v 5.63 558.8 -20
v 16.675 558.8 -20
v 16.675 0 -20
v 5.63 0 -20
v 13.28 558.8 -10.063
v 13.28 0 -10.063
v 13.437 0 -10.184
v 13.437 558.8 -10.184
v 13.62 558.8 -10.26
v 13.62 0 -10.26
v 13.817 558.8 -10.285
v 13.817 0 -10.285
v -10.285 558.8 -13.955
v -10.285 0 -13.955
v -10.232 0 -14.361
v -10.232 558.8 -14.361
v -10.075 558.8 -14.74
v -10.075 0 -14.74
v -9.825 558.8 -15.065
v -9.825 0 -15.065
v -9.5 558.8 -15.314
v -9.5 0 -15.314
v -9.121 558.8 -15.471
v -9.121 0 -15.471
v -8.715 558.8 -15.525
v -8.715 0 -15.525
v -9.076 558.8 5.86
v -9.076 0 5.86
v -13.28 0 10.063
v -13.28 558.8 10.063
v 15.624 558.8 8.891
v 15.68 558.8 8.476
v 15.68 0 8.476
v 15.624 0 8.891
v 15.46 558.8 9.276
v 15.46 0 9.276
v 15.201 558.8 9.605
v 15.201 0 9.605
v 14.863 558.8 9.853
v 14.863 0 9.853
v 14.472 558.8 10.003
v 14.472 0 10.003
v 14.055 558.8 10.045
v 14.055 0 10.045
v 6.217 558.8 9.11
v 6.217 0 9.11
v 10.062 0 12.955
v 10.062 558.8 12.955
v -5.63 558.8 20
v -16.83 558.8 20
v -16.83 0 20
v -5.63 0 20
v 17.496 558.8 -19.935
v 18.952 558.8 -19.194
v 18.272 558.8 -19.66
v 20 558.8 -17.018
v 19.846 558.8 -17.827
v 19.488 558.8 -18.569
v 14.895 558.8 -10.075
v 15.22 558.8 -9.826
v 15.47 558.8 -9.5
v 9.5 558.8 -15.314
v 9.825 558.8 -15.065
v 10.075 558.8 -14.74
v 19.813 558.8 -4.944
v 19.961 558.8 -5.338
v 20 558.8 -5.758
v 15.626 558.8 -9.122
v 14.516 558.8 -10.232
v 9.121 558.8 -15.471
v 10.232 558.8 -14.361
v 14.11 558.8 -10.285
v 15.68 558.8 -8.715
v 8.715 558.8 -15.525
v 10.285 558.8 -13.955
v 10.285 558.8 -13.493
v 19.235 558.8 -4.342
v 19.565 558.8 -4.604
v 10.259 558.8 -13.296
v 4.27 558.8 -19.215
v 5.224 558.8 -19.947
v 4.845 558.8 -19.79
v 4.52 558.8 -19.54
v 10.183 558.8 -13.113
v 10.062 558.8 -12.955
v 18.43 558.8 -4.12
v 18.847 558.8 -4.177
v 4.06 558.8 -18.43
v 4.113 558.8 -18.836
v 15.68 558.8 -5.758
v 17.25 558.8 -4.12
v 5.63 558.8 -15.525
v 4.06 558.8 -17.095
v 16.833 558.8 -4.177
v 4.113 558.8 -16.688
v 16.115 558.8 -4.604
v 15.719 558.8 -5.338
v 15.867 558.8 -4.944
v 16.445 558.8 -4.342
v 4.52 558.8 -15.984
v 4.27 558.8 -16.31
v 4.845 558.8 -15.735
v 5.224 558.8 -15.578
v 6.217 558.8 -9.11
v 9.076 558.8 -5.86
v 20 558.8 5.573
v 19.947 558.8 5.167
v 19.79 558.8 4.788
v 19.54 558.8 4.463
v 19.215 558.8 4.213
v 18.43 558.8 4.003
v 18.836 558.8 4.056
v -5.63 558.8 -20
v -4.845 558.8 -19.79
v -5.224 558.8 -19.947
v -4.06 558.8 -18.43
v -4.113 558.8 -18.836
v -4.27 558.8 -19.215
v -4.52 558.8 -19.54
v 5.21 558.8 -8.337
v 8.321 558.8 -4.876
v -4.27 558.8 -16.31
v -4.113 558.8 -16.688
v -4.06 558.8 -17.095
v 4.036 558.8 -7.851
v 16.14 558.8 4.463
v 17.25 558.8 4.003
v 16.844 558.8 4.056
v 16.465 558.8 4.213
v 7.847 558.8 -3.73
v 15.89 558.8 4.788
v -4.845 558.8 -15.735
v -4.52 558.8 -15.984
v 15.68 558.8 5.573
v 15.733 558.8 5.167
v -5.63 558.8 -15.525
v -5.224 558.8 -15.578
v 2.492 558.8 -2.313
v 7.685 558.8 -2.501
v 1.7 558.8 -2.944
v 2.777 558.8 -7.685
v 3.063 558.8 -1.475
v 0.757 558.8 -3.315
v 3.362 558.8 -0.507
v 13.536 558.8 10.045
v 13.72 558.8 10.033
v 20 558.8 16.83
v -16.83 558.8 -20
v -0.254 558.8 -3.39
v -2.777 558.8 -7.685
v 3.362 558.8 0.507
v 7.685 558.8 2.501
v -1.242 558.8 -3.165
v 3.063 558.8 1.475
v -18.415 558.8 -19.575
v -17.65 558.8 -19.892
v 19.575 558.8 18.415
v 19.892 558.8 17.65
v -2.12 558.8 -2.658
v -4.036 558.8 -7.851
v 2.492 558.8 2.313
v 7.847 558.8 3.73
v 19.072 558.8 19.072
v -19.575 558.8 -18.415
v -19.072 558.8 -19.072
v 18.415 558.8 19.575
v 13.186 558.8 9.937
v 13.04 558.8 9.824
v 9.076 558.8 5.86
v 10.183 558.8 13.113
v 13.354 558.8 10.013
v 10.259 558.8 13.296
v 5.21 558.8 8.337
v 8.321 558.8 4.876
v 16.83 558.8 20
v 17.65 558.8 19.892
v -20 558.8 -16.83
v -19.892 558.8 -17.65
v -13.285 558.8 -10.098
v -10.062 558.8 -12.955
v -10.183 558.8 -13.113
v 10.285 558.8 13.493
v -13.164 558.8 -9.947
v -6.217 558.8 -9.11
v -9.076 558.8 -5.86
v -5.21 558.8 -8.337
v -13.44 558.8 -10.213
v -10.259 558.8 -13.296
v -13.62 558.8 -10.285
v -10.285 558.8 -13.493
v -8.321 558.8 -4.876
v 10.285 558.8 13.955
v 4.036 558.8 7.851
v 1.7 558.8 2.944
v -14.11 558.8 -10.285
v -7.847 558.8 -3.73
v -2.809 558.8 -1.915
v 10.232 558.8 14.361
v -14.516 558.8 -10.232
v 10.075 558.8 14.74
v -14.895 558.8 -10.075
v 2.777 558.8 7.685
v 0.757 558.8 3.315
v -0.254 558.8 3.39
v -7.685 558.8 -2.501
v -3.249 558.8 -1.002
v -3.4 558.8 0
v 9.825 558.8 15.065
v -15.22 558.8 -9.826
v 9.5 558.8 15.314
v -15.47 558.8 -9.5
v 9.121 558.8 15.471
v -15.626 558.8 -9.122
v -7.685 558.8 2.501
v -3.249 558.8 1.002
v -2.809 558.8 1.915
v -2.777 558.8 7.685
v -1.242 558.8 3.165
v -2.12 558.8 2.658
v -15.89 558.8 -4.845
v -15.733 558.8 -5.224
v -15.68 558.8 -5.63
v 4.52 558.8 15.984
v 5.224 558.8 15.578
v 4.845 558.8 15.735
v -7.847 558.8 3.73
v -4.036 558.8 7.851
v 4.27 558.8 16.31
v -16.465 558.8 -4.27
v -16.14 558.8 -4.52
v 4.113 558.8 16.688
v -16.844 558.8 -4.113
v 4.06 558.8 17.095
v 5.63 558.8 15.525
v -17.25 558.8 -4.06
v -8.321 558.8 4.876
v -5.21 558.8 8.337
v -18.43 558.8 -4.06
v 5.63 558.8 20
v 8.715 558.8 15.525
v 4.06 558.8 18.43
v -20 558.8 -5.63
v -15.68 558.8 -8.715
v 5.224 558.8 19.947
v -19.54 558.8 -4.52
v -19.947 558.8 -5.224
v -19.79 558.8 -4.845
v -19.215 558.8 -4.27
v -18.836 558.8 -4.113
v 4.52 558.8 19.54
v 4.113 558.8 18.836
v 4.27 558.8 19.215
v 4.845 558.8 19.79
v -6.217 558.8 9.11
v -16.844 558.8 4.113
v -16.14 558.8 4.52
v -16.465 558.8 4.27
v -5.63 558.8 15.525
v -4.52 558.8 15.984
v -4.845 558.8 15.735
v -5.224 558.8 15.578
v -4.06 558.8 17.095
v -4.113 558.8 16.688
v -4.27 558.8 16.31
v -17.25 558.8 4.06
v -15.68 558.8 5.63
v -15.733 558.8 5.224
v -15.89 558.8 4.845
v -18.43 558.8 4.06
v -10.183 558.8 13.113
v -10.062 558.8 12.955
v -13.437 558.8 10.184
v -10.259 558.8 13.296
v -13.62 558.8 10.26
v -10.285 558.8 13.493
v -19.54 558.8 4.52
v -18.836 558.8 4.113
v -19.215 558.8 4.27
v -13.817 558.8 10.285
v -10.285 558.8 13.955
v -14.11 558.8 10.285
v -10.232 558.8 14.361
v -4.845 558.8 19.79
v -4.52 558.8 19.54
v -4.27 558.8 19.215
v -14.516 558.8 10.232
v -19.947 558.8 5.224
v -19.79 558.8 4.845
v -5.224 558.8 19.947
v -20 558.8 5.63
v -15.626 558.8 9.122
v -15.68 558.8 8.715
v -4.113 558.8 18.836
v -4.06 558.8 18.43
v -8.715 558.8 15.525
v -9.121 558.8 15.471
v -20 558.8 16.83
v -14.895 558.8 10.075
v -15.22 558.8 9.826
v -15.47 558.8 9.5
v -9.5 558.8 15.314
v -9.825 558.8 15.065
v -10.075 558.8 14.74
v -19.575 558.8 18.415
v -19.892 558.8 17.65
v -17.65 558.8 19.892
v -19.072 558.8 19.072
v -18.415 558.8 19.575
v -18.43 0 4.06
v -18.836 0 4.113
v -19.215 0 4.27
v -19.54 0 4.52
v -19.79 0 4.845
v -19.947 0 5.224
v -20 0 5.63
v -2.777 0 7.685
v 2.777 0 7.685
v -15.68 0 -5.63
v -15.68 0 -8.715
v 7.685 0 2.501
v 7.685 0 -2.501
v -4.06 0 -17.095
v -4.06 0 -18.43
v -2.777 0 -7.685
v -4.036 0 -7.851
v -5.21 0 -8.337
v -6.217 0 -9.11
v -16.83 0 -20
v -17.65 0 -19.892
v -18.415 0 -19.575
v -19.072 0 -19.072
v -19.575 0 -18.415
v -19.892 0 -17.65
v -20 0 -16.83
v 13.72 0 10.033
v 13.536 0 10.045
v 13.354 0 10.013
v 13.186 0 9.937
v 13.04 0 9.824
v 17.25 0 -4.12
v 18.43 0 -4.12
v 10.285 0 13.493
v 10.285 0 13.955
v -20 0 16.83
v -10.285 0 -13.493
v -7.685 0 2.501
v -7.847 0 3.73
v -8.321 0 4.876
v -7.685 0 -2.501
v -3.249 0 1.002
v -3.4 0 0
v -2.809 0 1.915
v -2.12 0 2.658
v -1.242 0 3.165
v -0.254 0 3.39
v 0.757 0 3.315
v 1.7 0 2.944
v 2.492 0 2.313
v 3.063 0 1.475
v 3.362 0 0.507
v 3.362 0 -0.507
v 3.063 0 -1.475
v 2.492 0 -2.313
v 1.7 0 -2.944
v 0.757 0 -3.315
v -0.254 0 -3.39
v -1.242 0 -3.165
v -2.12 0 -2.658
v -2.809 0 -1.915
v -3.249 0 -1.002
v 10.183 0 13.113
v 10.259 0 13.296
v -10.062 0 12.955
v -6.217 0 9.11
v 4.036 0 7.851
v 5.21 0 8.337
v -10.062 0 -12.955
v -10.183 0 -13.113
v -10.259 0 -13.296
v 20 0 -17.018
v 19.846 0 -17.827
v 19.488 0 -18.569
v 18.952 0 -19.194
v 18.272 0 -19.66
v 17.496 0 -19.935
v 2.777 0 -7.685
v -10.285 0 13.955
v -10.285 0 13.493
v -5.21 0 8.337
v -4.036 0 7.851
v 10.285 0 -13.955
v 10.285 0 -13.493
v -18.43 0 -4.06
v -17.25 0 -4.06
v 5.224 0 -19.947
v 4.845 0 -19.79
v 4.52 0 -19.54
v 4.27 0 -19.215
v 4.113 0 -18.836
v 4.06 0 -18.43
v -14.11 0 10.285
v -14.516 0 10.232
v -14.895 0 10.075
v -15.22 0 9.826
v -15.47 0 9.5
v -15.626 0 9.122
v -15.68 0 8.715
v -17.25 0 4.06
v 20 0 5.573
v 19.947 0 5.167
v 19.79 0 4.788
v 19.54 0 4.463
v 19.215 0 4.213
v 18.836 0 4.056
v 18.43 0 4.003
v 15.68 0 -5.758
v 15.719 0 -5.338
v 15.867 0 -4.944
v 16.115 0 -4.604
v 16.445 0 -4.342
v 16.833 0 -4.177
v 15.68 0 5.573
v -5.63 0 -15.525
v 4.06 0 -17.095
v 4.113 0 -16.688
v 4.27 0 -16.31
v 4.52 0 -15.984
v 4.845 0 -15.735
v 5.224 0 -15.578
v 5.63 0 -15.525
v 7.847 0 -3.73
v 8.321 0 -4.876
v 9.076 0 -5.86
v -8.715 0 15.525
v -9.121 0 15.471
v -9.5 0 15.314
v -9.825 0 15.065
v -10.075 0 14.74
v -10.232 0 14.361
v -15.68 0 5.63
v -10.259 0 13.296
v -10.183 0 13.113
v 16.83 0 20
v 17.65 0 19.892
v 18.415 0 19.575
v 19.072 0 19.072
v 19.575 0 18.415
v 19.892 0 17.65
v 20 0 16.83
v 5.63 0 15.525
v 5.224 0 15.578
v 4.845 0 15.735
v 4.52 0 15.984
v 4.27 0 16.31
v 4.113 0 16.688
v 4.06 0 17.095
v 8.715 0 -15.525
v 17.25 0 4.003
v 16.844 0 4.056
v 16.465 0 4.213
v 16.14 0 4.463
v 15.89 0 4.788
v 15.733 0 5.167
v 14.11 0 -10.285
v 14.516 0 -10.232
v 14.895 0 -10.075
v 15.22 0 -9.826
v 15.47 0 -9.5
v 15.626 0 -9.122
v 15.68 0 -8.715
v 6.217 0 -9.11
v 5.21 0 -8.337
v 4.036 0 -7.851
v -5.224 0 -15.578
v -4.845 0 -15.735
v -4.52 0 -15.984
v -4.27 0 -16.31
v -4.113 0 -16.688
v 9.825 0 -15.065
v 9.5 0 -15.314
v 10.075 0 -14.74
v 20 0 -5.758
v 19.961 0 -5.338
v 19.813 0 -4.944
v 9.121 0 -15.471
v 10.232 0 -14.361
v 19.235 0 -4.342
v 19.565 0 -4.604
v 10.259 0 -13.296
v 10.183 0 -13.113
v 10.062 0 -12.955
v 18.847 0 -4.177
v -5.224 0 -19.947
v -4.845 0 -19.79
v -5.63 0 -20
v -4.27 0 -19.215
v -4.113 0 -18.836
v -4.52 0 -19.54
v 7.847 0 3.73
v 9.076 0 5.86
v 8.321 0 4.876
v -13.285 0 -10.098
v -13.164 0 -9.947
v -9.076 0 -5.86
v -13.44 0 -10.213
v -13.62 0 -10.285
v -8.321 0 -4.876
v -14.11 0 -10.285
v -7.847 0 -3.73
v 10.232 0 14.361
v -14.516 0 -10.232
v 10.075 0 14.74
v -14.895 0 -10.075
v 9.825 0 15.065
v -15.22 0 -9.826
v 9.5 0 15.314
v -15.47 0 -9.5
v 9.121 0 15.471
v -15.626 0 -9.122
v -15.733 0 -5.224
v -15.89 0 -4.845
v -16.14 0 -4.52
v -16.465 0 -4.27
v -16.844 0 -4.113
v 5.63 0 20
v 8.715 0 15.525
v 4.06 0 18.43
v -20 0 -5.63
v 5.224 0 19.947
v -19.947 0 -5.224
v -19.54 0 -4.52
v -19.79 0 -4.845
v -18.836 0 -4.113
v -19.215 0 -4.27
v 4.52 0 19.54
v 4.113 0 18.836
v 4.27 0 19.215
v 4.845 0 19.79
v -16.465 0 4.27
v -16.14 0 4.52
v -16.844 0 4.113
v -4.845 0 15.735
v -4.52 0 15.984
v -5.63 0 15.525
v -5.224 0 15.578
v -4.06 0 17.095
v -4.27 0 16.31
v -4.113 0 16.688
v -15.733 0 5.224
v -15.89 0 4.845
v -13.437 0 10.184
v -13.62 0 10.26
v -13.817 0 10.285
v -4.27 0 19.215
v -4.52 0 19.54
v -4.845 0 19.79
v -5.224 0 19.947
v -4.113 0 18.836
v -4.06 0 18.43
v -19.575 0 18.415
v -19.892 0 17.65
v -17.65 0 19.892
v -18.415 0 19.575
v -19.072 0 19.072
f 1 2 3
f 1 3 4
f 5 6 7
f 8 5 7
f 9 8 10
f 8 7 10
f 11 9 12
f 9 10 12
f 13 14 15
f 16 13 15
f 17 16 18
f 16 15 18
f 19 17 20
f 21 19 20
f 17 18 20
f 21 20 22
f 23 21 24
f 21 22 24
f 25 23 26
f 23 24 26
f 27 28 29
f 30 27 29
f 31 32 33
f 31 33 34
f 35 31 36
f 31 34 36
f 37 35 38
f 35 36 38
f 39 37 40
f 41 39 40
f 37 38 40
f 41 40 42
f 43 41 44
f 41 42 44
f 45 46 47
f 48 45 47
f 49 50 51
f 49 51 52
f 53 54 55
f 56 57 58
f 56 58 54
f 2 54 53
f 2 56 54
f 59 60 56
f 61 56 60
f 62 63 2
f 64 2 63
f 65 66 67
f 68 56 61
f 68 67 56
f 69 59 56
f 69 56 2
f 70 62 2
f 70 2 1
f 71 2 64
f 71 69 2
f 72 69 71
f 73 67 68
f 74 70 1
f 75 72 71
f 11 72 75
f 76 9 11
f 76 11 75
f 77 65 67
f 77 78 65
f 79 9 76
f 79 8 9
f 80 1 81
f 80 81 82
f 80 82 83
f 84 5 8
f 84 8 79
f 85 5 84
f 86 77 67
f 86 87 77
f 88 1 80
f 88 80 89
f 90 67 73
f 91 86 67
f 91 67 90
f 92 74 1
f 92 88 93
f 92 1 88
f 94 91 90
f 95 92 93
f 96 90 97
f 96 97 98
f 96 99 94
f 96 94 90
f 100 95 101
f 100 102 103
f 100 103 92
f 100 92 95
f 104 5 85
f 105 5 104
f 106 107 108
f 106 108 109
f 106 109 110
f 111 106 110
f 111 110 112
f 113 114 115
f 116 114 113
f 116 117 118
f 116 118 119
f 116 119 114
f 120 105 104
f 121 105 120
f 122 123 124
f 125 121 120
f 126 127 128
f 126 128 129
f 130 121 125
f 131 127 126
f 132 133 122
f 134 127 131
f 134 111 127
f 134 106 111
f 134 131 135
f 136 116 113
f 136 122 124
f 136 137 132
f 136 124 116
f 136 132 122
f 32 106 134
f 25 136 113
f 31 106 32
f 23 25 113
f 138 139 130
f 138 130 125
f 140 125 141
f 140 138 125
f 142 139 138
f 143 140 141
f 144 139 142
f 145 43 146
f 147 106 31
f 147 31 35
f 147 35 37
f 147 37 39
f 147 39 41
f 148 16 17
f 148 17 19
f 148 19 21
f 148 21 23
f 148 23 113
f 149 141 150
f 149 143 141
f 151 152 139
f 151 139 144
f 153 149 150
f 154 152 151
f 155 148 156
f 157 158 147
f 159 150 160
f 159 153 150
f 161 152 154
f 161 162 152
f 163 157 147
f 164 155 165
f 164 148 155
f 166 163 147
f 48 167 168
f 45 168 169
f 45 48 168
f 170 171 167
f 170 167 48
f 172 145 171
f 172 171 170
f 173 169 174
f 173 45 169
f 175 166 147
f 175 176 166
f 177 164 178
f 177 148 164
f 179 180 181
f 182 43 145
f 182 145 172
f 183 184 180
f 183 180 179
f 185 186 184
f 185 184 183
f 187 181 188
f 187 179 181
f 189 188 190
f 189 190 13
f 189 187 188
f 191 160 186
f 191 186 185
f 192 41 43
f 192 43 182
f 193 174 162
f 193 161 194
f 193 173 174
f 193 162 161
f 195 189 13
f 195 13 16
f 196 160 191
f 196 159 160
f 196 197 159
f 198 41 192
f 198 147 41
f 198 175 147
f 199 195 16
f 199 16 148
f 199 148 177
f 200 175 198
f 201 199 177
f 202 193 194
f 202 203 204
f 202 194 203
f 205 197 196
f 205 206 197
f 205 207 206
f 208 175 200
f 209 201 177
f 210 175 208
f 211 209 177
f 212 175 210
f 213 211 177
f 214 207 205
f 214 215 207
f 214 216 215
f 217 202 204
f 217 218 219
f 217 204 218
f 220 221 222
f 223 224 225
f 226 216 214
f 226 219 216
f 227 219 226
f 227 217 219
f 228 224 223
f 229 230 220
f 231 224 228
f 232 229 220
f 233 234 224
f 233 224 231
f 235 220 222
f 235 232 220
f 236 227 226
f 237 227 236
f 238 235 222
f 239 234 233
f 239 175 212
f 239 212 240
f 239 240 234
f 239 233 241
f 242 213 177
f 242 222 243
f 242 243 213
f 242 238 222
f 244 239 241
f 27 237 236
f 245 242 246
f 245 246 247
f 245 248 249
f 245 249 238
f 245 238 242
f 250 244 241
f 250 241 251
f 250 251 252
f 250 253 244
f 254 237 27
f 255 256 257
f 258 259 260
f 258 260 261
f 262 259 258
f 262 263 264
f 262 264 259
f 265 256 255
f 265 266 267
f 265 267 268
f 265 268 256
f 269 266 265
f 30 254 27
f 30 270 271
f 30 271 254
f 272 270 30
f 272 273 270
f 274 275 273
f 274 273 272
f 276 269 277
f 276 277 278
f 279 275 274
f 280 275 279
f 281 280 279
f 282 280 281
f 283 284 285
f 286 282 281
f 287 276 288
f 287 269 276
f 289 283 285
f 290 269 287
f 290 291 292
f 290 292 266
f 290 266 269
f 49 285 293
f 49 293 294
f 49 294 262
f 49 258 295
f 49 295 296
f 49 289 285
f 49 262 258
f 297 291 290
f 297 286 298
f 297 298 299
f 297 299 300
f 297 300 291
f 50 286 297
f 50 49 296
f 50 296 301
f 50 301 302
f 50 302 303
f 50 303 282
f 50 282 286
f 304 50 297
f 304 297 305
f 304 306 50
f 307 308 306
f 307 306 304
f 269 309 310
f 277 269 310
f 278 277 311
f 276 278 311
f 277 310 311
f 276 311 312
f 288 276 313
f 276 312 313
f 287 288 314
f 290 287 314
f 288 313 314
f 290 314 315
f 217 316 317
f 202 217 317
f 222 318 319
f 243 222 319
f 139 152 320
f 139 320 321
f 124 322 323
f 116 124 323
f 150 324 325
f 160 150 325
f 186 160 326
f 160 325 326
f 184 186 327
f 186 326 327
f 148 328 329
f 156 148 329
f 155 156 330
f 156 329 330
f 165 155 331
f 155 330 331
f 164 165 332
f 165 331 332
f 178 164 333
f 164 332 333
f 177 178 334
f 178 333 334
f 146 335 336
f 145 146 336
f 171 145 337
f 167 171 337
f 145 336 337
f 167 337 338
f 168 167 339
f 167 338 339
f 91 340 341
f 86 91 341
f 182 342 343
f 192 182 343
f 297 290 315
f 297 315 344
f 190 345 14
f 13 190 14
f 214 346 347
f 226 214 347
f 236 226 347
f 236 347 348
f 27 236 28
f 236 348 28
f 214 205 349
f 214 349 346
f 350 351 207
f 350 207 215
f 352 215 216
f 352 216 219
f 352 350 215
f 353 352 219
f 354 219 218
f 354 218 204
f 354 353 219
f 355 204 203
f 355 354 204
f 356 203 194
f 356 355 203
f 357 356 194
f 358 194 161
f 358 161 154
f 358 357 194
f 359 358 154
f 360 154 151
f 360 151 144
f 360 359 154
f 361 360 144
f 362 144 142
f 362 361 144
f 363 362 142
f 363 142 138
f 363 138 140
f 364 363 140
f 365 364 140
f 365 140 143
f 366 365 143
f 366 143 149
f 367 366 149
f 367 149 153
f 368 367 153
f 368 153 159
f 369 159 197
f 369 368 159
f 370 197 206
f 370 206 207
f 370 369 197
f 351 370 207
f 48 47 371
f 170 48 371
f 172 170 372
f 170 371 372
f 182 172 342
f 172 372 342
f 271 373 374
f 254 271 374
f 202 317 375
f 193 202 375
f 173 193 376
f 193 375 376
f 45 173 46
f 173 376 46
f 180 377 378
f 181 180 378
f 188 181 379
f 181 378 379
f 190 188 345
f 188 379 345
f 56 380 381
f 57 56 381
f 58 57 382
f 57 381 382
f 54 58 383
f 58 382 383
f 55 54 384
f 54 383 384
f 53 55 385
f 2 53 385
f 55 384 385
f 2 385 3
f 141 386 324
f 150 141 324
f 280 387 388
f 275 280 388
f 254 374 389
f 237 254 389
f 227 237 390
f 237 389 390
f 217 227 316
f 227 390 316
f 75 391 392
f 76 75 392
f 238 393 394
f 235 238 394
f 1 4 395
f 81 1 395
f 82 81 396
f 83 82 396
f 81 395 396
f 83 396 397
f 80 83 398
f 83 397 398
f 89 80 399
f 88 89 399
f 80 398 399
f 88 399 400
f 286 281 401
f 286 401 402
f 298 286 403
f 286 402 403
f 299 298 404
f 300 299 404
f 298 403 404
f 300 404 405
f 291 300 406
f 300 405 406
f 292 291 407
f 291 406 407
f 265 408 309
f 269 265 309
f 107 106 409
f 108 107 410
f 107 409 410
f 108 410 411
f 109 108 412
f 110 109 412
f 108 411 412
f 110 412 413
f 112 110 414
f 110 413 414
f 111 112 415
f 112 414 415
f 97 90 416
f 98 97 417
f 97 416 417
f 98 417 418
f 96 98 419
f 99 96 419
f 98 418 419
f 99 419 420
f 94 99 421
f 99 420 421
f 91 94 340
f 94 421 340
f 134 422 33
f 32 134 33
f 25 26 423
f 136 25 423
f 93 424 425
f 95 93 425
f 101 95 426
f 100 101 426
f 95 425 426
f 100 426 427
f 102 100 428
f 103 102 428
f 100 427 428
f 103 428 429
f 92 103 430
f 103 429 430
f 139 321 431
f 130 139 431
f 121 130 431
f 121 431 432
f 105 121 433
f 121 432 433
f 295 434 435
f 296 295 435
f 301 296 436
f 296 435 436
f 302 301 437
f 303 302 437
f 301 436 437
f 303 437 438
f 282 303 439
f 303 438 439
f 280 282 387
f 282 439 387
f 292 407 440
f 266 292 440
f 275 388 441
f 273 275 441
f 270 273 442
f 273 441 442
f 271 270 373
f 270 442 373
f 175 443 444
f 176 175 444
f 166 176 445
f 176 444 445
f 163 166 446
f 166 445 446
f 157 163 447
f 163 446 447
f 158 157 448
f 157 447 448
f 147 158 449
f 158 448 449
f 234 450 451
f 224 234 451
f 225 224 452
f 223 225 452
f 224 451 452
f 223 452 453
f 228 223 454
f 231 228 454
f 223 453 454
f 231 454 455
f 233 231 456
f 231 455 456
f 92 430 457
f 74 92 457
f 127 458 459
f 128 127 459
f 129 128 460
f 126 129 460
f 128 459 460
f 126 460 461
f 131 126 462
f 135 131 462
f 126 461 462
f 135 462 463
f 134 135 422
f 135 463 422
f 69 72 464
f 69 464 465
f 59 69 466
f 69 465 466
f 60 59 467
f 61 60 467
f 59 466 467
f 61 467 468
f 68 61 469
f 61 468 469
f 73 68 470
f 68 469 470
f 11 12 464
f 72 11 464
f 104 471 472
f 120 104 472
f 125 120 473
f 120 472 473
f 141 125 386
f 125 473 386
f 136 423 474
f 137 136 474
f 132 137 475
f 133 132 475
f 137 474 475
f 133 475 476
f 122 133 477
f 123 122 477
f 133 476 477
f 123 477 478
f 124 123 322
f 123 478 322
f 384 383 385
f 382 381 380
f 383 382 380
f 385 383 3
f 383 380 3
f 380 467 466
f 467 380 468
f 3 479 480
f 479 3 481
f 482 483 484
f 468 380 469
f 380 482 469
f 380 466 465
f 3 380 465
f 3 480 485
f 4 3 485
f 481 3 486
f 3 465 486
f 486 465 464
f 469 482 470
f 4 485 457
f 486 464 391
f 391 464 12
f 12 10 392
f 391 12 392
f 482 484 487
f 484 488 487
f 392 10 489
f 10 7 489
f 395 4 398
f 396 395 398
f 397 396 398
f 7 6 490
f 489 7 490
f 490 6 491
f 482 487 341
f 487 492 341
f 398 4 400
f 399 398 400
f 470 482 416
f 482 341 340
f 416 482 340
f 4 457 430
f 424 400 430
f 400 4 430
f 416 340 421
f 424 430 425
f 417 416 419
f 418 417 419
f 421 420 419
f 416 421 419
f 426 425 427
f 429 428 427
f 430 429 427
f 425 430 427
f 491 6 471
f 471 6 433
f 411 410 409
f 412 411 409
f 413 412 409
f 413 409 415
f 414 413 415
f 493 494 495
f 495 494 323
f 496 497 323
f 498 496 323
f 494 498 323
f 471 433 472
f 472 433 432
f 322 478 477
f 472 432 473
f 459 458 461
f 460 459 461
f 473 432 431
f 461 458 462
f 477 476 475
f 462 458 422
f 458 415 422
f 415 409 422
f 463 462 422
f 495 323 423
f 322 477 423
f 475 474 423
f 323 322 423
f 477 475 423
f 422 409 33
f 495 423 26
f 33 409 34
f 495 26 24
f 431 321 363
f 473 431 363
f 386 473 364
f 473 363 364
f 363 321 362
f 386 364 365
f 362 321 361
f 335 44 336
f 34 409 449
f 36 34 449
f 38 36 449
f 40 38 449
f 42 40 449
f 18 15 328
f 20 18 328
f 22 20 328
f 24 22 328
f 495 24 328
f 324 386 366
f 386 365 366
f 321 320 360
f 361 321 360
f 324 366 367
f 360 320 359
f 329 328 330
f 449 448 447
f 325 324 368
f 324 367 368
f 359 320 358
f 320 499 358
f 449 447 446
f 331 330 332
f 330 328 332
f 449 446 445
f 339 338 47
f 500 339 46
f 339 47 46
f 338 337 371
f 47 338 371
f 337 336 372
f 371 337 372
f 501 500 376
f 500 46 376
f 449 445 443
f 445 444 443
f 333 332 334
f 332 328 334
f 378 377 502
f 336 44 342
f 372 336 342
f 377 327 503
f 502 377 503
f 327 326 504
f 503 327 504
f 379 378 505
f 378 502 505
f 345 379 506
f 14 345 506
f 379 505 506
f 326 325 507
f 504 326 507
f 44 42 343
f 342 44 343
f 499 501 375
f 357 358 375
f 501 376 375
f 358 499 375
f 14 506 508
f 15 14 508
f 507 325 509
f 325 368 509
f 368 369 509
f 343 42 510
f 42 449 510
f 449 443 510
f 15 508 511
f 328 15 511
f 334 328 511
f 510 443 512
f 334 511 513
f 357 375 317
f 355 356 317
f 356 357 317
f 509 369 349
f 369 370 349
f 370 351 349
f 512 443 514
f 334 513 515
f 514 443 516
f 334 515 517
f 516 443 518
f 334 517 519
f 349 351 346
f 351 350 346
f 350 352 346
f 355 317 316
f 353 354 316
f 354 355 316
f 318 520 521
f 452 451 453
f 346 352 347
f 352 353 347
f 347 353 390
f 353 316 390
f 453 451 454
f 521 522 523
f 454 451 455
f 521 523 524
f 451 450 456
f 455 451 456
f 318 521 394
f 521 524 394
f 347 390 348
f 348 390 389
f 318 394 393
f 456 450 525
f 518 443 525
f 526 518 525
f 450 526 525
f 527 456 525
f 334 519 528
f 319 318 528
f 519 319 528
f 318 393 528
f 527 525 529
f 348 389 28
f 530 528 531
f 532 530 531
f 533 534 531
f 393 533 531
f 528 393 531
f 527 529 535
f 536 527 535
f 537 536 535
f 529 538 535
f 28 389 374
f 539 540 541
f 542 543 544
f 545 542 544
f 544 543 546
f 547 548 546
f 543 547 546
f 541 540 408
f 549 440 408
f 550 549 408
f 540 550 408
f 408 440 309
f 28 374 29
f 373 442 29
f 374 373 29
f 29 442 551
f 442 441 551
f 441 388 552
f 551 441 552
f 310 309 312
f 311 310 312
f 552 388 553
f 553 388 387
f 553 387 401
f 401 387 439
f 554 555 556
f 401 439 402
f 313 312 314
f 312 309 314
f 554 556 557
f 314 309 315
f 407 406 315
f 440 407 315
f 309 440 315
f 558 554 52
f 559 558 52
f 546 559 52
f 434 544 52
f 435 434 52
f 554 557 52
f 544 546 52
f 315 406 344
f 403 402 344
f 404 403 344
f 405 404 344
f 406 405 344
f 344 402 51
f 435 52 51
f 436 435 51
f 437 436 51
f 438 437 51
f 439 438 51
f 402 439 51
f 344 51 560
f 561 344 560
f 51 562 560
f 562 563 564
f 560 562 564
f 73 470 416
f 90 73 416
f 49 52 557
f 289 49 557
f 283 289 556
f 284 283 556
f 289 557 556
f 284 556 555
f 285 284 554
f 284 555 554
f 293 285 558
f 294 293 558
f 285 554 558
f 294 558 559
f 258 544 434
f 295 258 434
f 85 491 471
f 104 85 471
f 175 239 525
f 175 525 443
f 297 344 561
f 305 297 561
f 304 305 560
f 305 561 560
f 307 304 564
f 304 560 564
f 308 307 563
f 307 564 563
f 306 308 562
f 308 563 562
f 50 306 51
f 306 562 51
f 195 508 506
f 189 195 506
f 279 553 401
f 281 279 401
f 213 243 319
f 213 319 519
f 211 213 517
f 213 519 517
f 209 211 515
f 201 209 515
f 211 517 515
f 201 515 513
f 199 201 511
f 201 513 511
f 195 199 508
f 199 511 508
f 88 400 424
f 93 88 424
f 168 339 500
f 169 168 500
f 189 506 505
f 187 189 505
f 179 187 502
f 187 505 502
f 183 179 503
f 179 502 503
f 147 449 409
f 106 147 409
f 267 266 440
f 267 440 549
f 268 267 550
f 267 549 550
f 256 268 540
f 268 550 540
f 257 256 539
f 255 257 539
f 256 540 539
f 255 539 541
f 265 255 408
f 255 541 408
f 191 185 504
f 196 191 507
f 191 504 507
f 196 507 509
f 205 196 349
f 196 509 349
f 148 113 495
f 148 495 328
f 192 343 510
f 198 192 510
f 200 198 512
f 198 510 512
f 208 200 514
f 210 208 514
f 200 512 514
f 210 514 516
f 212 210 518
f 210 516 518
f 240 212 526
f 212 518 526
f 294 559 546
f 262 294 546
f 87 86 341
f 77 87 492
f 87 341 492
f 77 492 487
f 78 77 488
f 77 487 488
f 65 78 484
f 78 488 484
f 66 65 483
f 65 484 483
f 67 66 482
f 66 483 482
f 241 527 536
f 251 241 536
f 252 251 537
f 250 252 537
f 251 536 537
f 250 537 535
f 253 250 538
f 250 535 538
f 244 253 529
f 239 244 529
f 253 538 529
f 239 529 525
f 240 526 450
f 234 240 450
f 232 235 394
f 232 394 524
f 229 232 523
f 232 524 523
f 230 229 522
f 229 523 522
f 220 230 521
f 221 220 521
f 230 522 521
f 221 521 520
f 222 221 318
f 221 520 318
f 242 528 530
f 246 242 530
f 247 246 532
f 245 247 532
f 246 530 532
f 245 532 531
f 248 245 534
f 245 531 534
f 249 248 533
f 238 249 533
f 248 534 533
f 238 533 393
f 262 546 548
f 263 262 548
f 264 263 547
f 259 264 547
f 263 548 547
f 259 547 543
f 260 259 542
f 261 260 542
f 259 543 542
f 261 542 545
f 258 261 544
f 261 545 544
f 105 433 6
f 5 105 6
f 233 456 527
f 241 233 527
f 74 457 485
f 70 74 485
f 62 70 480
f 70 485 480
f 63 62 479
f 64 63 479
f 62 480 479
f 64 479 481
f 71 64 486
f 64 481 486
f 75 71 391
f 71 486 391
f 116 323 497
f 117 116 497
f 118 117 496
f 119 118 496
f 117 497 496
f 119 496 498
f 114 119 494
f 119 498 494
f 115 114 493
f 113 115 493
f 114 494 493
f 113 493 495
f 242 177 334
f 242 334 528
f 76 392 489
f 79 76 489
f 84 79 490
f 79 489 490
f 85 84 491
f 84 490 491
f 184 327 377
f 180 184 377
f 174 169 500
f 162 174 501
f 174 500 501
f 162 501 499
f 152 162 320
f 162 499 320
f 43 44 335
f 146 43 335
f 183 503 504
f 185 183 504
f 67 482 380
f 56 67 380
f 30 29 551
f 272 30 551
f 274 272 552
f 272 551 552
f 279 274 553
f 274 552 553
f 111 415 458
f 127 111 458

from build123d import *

# Parameters (mm, degrees)
SKETCH11_R               = 3.4
F_40_SERIES_4040_1_DEPTH = 558.8


with BuildPart() as part:
    # Sketch11 → 40 series 4040(1) (new body)
    with BuildSketch(Plane(origin=(0, 0, 0), x_dir=(-1, 0, 0), z_dir=(0, 1, 0))):
        with BuildLine():
            Line((-5.63, -15.524615034), (-8.715, -15.524615034))
            ThreePointArc((-8.715, -15.524615034), (-9.825157646, -15.06477268), (-10.285, -13.954615034))
            Line((-10.285, -13.954615034), (-10.285, -13.492503602))
            ThreePointArc((-10.285, -13.492503602), (-10.227148445, -13.201664194), (-10.062401154, -12.955102448))
            Line((-10.062401154, -12.955102448), (-6.217092793, -9.109794088))
            ThreePointArc((-6.217092793, -9.109794088), (-4.63891877, -8.055291919), (-2.777335583, -7.685))
            Line((-2.777335583, -7.685), (2.777335583, -7.685))
            ThreePointArc((2.777335583, -7.685), (4.63891877, -8.055291919), (6.217092793, -9.109794088))
            Line((6.217092793, -9.109794088), (10.062401154, -12.955102448))
            ThreePointArc((10.062401154, -12.955102448), (10.227148445, -13.201664194), (10.285, -13.492503602))
            Line((10.285, -13.492503602), (10.285, -13.954615034))
            ThreePointArc((10.285, -13.954615034), (9.825157646, -15.06477268), (8.715, -15.524615034))
            Line((8.715, -15.524615034), (5.63, -15.524615034))
            ThreePointArc((5.63, -15.524615034), (4.519842354, -15.984457388), (4.06, -17.094615034))
            Line((4.06, -17.094615034), (4.06, -18.43))
            ThreePointArc((4.06, -18.43), (4.519842354, -19.540157646), (5.63, -20))
            Line((5.63, -20), (16.83, -20))
            ThreePointArc((16.83, -20), (19.071528496, -19.071528496), (20, -16.83))
            Line((20, -16.83), (20, -5.63))
            ThreePointArc((20, -5.63), (19.540157461, -4.519842693), (18.43, -4.060000526))
            Line((18.43, -4.060000526), (17.24999625, -4.060000526))
            ThreePointArc((17.24999625, -4.060000526), (16.139838603, -4.519842879), (15.67999625, -5.630000526))
            Line((15.67999625, -5.630000526), (15.67999625, -8.715399492))
            ThreePointArc((15.67999625, -8.715399492), (15.220153896, -9.825557139), (14.10999625, -10.285399492))
            Line((14.10999625, -10.285399492), (13.6200547, -10.285399492))
            ThreePointArc((13.6200547, -10.285399492), (13.35903797, -10.160433474), (13.163657296, -9.946956002))
            Line((13.163657296, -9.946956002), (9.076242789, -5.859541495))
            ThreePointArc((9.076242789, -5.859541495), (8.046572221, -4.318530588), (7.685, -2.500784284))
            Line((7.685, -2.500784284), (7.685, 2.500784284))
            ThreePointArc((7.685, 2.500784284), (8.046572221, 4.318530588), (9.076242789, 5.859541495))
            Line((9.076242789, 5.859541495), (13.279501941, 10.062800646))
            ThreePointArc((13.279501941, 10.062800646), (13.526063686, 10.227547937), (13.816903094, 10.285399492))
            Line((13.816903094, 10.285399492), (14.10999625, 10.285399492))
            ThreePointArc((14.10999625, 10.285399492), (15.220153896, 9.825557139), (15.67999625, 8.715399492))
            Line((15.67999625, 8.715399492), (15.67999625, 5.630000526))
            ThreePointArc((15.67999625, 5.630000526), (16.139838603, 4.519842879), (17.24999625, 4.060000526))
            Line((17.24999625, 4.060000526), (18.43, 4.060000526))
            ThreePointArc((18.43, 4.060000526), (19.540157461, 4.519842693), (20, 5.63))
            Line((20, 5.63), (20, 16.83))
            ThreePointArc((20, 16.83), (19.071528496, 19.071528496), (16.83, 20))
            Line((16.83, 20), (5.63, 20))
            ThreePointArc((5.63, 20), (4.519842354, 19.540157646), (4.06, 18.43))
            Line((4.06, 18.43), (4.06, 17.094615034))
            ThreePointArc((4.06, 17.094615034), (4.519842354, 15.984457388), (5.63, 15.524615034))
            Line((5.63, 15.524615034), (8.715, 15.524615034))
            ThreePointArc((8.715, 15.524615034), (9.825157646, 15.06477268), (10.285, 13.954615034))
            Line((10.285, 13.954615034), (10.285, 13.492503602))
            ThreePointArc((10.285, 13.492503602), (10.227148445, 13.201664194), (10.062401154, 12.955102448))
            Line((10.062401154, 12.955102448), (6.217092793, 9.109794088))
            ThreePointArc((6.217092793, 9.109794088), (4.63891877, 8.055291919), (2.777335583, 7.685))
            Line((2.777335583, 7.685), (-2.777335583, 7.685))
            ThreePointArc((-2.777335583, 7.685), (-4.63891877, 8.055291919), (-6.217092793, 9.109794088))
            Line((-6.217092793, 9.109794088), (-10.062401154, 12.955102448))
            ThreePointArc((-10.062401154, 12.955102448), (-10.227148445, 13.201664194), (-10.285, 13.492503602))
            Line((-10.285, 13.492503602), (-10.285, 13.954615034))
            ThreePointArc((-10.285, 13.954615034), (-9.825157646, 15.06477268), (-8.715, 15.524615034))
            Line((-8.715, 15.524615034), (-5.63, 15.524615034))
            ThreePointArc((-5.63, 15.524615034), (-4.519842354, 15.984457388), (-4.06, 17.094615034))
            Line((-4.06, 17.094615034), (-4.06, 18.43))
            ThreePointArc((-4.06, 18.43), (-4.519842354, 19.540157646), (-5.63, 20))
            Line((-5.63, 20), (-16.83, 20))
            ThreePointArc((-16.83, 20), (-19.071528496, 19.071528496), (-20, 16.83))
            Line((-20, 16.83), (-20, 5.572979049))
            ThreePointArc((-20, 5.572979049), (-19.540157646, 4.462821403), (-18.43, 4.002979049))
            Line((-18.43, 4.002979049), (-17.25, 4.002979049))
            ThreePointArc((-17.25, 4.002979049), (-16.139842354, 4.462821403), (-15.68, 5.572979049))
            Line((-15.68, 5.572979049), (-15.68, 8.475666998))
            ThreePointArc((-15.68, 8.475666998), (-15.200613642, 9.605030484), (-14.05520779, 10.044710596))
            Line((-14.05520779, 10.044710596), (-13.71989919, 10.033001362))
            ThreePointArc((-13.71989919, 10.033001362), (-13.354224618, 10.012729352), (-13.040489136, 9.823787841))
            Line((-13.040489136, 9.823787841), (-9.076242789, 5.859541495))
            ThreePointArc((-9.076242789, 5.859541495), (-8.046572221, 4.318530588), (-7.685, 2.500784284))
            Line((-7.685, 2.500784284), (-7.685, -2.500784284))
            ThreePointArc((-7.685, -2.500784284), (-8.046572221, -4.318530588), (-9.076242789, -5.859541495))
            Line((-9.076242789, -5.859541495), (-13.279501941, -10.062800646))
            ThreePointArc((-13.279501941, -10.062800646), (-13.526061711, -10.227547119), (-13.816898819, -10.285399492))
            Line((-13.816898819, -10.285399492), (-14.10999625, -10.285399492))
            ThreePointArc((-14.10999625, -10.285399492), (-15.220153896, -9.825557139), (-15.67999625, -8.715399492))
            Line((-15.67999625, -8.715399492), (-15.67999625, -5.757919334))
            ThreePointArc((-15.67999625, -5.757919334), (-16.115287682, -4.60388249), (-17.25, -4.120449326))
            Line((-17.25, -4.120449326), (-18.43, -4.120449326))
            ThreePointArc((-18.43, -4.120449326), (-19.564709668, -4.603883664), (-20, -5.757918808))
            Line((-20, -5.757918808), (-20, -17.018368134))
            ThreePointArc((-20, -17.018368134), (-18.951578385, -19.194274381), (-16.674615034, -20))
            Line((-16.674615034, -20), (-5.63, -20))
            ThreePointArc((-5.63, -20), (-4.519842354, -19.540157646), (-4.06, -18.43))
            Line((-4.06, -18.43), (-4.06, -17.094615034))
            ThreePointArc((-4.06, -17.094615034), (-4.519842354, -15.984457388), (-5.63, -15.524615034))
        make_face()
        Circle(SKETCH11_R, mode=Mode.SUBTRACT)
    extrude(amount=F_40_SERIES_4040_1_DEPTH)


solid = part.part
